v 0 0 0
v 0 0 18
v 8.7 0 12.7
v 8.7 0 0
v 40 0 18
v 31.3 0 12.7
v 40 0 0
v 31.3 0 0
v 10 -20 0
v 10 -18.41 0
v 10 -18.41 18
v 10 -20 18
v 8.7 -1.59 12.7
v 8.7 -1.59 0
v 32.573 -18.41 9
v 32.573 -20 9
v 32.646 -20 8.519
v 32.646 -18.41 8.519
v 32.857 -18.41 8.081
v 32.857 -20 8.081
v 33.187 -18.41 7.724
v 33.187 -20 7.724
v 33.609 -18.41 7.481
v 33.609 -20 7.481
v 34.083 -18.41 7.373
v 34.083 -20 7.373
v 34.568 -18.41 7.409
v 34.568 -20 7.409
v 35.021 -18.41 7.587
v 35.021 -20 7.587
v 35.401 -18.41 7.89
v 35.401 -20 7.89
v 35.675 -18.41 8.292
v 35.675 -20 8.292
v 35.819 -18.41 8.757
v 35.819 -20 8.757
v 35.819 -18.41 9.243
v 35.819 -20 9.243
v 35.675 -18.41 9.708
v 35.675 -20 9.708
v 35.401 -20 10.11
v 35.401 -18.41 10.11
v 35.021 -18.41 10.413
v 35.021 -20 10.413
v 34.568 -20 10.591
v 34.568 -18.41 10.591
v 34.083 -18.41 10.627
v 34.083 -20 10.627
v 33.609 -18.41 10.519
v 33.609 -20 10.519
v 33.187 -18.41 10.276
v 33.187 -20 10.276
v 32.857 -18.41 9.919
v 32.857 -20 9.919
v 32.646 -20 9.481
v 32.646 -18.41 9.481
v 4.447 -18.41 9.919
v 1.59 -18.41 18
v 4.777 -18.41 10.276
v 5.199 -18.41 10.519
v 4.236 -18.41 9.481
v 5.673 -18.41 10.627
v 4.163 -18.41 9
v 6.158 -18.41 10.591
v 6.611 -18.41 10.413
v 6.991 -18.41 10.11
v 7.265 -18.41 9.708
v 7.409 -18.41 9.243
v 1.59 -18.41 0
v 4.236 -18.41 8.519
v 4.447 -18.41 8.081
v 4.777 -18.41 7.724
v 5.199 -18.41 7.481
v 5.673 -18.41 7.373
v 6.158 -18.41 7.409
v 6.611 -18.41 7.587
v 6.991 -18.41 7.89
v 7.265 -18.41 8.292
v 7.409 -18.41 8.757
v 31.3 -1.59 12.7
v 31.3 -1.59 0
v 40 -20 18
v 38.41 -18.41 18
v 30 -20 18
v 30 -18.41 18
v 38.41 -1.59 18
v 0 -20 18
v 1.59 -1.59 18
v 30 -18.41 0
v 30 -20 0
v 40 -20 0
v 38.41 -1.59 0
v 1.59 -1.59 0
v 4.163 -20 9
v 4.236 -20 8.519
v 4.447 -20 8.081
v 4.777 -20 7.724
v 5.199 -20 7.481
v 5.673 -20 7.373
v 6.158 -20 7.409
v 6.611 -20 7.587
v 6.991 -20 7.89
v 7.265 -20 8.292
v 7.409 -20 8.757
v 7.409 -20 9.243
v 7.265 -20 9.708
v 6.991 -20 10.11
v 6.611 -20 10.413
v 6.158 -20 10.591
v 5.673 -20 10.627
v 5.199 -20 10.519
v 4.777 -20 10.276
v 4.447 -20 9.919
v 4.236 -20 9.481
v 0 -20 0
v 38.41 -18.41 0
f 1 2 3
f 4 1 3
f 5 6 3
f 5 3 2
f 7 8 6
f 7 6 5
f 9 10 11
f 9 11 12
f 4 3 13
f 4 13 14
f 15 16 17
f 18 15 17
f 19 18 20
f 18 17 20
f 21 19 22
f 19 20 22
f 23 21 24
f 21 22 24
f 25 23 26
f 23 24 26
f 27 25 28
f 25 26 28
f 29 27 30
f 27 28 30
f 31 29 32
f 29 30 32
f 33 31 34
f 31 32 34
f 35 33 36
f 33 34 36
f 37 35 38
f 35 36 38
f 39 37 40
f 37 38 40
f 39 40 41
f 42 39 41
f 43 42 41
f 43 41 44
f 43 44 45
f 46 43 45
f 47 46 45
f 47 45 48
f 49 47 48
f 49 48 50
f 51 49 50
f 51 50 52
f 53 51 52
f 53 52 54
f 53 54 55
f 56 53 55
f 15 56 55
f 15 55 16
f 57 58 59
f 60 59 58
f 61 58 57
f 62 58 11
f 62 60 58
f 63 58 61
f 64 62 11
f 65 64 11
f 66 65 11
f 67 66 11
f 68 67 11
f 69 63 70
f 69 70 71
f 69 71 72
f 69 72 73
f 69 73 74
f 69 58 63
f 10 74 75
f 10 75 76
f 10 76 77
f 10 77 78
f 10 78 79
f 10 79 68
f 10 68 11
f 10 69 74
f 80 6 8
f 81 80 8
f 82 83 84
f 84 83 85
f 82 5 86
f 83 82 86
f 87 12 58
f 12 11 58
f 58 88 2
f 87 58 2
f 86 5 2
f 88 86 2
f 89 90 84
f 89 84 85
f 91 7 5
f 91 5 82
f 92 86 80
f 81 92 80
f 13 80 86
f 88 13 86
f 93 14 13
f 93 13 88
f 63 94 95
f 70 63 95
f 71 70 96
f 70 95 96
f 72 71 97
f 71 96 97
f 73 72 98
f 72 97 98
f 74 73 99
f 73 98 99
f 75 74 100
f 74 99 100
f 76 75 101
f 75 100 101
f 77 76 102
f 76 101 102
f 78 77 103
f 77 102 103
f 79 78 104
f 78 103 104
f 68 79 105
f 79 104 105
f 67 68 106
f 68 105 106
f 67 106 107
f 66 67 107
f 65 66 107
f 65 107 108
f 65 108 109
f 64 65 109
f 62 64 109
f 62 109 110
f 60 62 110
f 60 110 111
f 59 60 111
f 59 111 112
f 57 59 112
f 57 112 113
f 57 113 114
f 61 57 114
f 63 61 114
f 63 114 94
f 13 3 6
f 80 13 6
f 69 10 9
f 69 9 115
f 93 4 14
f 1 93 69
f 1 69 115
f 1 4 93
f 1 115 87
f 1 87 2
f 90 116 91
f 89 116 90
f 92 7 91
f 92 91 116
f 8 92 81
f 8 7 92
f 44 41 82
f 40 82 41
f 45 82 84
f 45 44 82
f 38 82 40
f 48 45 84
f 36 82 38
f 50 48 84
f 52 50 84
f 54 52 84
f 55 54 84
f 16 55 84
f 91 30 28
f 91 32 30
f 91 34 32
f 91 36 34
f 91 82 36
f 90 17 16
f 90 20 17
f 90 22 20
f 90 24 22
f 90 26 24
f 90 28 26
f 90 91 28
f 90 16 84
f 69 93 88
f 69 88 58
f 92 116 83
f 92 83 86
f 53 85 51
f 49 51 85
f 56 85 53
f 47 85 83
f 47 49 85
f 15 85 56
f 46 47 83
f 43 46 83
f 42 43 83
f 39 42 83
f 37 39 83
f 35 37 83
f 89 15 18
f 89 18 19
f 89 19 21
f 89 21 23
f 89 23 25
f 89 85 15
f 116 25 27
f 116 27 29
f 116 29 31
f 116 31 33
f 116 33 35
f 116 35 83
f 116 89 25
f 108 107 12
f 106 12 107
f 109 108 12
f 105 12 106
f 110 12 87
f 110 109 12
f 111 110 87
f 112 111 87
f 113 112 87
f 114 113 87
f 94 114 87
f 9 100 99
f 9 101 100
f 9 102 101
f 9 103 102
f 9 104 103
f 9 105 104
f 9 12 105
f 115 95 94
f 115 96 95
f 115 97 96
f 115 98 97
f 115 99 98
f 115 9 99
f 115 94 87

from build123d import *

# Parameters (mm, degrees)
BOSS_EXTRUDE1_DEPTH       = 18
SKETCH2_W                 = 22.6
SKETCH2_H                 = 12.7
CUT_EXTRUDE1_DEPTH        = 10
F_4_CLEARANCE_HOLE3_D     = 3.2639
F_4_CLEARANCE_HOLE3_DEPTH = 1.59


with BuildPart() as part:
    # Sketch1 → Boss-Extrude1 (new body)
    with BuildSketch(Plane.XY):
        Polygon((10, -20), (0, -20), (0, 0), (40, 0), (40, -20), (30, -20), (30, -18.41), (38.41, -18.41), (38.41, -1.59), (1.59, -1.59), (1.59, -18.41), (10, -18.41), align=None)
    extrude(amount=BOSS_EXTRUDE1_DEPTH)

    # Sketch2 → Cut-Extrude1 (cut)
    with BuildSketch(Plane(origin=(0, 0, 0), x_dir=(1, 0, 0), z_dir=(0, 1, 0))):
        with Locations((20, -6.35)):
            Rectangle(SKETCH2_W, SKETCH2_H)
    extrude(amount=-CUT_EXTRUDE1_DEPTH, mode=Mode.SUBTRACT)

    # #4 Clearance Hole3
    with Locations(Plane(origin=(0, -18.41, 0), x_dir=(1, 0, 0), z_dir=(0, 1, 0))):
        with Locations((5.795, -9), (34.205, -9)):
            Hole(F_4_CLEARANCE_HOLE3_D / 2, depth=F_4_CLEARANCE_HOLE3_DEPTH)


solid = part.part
